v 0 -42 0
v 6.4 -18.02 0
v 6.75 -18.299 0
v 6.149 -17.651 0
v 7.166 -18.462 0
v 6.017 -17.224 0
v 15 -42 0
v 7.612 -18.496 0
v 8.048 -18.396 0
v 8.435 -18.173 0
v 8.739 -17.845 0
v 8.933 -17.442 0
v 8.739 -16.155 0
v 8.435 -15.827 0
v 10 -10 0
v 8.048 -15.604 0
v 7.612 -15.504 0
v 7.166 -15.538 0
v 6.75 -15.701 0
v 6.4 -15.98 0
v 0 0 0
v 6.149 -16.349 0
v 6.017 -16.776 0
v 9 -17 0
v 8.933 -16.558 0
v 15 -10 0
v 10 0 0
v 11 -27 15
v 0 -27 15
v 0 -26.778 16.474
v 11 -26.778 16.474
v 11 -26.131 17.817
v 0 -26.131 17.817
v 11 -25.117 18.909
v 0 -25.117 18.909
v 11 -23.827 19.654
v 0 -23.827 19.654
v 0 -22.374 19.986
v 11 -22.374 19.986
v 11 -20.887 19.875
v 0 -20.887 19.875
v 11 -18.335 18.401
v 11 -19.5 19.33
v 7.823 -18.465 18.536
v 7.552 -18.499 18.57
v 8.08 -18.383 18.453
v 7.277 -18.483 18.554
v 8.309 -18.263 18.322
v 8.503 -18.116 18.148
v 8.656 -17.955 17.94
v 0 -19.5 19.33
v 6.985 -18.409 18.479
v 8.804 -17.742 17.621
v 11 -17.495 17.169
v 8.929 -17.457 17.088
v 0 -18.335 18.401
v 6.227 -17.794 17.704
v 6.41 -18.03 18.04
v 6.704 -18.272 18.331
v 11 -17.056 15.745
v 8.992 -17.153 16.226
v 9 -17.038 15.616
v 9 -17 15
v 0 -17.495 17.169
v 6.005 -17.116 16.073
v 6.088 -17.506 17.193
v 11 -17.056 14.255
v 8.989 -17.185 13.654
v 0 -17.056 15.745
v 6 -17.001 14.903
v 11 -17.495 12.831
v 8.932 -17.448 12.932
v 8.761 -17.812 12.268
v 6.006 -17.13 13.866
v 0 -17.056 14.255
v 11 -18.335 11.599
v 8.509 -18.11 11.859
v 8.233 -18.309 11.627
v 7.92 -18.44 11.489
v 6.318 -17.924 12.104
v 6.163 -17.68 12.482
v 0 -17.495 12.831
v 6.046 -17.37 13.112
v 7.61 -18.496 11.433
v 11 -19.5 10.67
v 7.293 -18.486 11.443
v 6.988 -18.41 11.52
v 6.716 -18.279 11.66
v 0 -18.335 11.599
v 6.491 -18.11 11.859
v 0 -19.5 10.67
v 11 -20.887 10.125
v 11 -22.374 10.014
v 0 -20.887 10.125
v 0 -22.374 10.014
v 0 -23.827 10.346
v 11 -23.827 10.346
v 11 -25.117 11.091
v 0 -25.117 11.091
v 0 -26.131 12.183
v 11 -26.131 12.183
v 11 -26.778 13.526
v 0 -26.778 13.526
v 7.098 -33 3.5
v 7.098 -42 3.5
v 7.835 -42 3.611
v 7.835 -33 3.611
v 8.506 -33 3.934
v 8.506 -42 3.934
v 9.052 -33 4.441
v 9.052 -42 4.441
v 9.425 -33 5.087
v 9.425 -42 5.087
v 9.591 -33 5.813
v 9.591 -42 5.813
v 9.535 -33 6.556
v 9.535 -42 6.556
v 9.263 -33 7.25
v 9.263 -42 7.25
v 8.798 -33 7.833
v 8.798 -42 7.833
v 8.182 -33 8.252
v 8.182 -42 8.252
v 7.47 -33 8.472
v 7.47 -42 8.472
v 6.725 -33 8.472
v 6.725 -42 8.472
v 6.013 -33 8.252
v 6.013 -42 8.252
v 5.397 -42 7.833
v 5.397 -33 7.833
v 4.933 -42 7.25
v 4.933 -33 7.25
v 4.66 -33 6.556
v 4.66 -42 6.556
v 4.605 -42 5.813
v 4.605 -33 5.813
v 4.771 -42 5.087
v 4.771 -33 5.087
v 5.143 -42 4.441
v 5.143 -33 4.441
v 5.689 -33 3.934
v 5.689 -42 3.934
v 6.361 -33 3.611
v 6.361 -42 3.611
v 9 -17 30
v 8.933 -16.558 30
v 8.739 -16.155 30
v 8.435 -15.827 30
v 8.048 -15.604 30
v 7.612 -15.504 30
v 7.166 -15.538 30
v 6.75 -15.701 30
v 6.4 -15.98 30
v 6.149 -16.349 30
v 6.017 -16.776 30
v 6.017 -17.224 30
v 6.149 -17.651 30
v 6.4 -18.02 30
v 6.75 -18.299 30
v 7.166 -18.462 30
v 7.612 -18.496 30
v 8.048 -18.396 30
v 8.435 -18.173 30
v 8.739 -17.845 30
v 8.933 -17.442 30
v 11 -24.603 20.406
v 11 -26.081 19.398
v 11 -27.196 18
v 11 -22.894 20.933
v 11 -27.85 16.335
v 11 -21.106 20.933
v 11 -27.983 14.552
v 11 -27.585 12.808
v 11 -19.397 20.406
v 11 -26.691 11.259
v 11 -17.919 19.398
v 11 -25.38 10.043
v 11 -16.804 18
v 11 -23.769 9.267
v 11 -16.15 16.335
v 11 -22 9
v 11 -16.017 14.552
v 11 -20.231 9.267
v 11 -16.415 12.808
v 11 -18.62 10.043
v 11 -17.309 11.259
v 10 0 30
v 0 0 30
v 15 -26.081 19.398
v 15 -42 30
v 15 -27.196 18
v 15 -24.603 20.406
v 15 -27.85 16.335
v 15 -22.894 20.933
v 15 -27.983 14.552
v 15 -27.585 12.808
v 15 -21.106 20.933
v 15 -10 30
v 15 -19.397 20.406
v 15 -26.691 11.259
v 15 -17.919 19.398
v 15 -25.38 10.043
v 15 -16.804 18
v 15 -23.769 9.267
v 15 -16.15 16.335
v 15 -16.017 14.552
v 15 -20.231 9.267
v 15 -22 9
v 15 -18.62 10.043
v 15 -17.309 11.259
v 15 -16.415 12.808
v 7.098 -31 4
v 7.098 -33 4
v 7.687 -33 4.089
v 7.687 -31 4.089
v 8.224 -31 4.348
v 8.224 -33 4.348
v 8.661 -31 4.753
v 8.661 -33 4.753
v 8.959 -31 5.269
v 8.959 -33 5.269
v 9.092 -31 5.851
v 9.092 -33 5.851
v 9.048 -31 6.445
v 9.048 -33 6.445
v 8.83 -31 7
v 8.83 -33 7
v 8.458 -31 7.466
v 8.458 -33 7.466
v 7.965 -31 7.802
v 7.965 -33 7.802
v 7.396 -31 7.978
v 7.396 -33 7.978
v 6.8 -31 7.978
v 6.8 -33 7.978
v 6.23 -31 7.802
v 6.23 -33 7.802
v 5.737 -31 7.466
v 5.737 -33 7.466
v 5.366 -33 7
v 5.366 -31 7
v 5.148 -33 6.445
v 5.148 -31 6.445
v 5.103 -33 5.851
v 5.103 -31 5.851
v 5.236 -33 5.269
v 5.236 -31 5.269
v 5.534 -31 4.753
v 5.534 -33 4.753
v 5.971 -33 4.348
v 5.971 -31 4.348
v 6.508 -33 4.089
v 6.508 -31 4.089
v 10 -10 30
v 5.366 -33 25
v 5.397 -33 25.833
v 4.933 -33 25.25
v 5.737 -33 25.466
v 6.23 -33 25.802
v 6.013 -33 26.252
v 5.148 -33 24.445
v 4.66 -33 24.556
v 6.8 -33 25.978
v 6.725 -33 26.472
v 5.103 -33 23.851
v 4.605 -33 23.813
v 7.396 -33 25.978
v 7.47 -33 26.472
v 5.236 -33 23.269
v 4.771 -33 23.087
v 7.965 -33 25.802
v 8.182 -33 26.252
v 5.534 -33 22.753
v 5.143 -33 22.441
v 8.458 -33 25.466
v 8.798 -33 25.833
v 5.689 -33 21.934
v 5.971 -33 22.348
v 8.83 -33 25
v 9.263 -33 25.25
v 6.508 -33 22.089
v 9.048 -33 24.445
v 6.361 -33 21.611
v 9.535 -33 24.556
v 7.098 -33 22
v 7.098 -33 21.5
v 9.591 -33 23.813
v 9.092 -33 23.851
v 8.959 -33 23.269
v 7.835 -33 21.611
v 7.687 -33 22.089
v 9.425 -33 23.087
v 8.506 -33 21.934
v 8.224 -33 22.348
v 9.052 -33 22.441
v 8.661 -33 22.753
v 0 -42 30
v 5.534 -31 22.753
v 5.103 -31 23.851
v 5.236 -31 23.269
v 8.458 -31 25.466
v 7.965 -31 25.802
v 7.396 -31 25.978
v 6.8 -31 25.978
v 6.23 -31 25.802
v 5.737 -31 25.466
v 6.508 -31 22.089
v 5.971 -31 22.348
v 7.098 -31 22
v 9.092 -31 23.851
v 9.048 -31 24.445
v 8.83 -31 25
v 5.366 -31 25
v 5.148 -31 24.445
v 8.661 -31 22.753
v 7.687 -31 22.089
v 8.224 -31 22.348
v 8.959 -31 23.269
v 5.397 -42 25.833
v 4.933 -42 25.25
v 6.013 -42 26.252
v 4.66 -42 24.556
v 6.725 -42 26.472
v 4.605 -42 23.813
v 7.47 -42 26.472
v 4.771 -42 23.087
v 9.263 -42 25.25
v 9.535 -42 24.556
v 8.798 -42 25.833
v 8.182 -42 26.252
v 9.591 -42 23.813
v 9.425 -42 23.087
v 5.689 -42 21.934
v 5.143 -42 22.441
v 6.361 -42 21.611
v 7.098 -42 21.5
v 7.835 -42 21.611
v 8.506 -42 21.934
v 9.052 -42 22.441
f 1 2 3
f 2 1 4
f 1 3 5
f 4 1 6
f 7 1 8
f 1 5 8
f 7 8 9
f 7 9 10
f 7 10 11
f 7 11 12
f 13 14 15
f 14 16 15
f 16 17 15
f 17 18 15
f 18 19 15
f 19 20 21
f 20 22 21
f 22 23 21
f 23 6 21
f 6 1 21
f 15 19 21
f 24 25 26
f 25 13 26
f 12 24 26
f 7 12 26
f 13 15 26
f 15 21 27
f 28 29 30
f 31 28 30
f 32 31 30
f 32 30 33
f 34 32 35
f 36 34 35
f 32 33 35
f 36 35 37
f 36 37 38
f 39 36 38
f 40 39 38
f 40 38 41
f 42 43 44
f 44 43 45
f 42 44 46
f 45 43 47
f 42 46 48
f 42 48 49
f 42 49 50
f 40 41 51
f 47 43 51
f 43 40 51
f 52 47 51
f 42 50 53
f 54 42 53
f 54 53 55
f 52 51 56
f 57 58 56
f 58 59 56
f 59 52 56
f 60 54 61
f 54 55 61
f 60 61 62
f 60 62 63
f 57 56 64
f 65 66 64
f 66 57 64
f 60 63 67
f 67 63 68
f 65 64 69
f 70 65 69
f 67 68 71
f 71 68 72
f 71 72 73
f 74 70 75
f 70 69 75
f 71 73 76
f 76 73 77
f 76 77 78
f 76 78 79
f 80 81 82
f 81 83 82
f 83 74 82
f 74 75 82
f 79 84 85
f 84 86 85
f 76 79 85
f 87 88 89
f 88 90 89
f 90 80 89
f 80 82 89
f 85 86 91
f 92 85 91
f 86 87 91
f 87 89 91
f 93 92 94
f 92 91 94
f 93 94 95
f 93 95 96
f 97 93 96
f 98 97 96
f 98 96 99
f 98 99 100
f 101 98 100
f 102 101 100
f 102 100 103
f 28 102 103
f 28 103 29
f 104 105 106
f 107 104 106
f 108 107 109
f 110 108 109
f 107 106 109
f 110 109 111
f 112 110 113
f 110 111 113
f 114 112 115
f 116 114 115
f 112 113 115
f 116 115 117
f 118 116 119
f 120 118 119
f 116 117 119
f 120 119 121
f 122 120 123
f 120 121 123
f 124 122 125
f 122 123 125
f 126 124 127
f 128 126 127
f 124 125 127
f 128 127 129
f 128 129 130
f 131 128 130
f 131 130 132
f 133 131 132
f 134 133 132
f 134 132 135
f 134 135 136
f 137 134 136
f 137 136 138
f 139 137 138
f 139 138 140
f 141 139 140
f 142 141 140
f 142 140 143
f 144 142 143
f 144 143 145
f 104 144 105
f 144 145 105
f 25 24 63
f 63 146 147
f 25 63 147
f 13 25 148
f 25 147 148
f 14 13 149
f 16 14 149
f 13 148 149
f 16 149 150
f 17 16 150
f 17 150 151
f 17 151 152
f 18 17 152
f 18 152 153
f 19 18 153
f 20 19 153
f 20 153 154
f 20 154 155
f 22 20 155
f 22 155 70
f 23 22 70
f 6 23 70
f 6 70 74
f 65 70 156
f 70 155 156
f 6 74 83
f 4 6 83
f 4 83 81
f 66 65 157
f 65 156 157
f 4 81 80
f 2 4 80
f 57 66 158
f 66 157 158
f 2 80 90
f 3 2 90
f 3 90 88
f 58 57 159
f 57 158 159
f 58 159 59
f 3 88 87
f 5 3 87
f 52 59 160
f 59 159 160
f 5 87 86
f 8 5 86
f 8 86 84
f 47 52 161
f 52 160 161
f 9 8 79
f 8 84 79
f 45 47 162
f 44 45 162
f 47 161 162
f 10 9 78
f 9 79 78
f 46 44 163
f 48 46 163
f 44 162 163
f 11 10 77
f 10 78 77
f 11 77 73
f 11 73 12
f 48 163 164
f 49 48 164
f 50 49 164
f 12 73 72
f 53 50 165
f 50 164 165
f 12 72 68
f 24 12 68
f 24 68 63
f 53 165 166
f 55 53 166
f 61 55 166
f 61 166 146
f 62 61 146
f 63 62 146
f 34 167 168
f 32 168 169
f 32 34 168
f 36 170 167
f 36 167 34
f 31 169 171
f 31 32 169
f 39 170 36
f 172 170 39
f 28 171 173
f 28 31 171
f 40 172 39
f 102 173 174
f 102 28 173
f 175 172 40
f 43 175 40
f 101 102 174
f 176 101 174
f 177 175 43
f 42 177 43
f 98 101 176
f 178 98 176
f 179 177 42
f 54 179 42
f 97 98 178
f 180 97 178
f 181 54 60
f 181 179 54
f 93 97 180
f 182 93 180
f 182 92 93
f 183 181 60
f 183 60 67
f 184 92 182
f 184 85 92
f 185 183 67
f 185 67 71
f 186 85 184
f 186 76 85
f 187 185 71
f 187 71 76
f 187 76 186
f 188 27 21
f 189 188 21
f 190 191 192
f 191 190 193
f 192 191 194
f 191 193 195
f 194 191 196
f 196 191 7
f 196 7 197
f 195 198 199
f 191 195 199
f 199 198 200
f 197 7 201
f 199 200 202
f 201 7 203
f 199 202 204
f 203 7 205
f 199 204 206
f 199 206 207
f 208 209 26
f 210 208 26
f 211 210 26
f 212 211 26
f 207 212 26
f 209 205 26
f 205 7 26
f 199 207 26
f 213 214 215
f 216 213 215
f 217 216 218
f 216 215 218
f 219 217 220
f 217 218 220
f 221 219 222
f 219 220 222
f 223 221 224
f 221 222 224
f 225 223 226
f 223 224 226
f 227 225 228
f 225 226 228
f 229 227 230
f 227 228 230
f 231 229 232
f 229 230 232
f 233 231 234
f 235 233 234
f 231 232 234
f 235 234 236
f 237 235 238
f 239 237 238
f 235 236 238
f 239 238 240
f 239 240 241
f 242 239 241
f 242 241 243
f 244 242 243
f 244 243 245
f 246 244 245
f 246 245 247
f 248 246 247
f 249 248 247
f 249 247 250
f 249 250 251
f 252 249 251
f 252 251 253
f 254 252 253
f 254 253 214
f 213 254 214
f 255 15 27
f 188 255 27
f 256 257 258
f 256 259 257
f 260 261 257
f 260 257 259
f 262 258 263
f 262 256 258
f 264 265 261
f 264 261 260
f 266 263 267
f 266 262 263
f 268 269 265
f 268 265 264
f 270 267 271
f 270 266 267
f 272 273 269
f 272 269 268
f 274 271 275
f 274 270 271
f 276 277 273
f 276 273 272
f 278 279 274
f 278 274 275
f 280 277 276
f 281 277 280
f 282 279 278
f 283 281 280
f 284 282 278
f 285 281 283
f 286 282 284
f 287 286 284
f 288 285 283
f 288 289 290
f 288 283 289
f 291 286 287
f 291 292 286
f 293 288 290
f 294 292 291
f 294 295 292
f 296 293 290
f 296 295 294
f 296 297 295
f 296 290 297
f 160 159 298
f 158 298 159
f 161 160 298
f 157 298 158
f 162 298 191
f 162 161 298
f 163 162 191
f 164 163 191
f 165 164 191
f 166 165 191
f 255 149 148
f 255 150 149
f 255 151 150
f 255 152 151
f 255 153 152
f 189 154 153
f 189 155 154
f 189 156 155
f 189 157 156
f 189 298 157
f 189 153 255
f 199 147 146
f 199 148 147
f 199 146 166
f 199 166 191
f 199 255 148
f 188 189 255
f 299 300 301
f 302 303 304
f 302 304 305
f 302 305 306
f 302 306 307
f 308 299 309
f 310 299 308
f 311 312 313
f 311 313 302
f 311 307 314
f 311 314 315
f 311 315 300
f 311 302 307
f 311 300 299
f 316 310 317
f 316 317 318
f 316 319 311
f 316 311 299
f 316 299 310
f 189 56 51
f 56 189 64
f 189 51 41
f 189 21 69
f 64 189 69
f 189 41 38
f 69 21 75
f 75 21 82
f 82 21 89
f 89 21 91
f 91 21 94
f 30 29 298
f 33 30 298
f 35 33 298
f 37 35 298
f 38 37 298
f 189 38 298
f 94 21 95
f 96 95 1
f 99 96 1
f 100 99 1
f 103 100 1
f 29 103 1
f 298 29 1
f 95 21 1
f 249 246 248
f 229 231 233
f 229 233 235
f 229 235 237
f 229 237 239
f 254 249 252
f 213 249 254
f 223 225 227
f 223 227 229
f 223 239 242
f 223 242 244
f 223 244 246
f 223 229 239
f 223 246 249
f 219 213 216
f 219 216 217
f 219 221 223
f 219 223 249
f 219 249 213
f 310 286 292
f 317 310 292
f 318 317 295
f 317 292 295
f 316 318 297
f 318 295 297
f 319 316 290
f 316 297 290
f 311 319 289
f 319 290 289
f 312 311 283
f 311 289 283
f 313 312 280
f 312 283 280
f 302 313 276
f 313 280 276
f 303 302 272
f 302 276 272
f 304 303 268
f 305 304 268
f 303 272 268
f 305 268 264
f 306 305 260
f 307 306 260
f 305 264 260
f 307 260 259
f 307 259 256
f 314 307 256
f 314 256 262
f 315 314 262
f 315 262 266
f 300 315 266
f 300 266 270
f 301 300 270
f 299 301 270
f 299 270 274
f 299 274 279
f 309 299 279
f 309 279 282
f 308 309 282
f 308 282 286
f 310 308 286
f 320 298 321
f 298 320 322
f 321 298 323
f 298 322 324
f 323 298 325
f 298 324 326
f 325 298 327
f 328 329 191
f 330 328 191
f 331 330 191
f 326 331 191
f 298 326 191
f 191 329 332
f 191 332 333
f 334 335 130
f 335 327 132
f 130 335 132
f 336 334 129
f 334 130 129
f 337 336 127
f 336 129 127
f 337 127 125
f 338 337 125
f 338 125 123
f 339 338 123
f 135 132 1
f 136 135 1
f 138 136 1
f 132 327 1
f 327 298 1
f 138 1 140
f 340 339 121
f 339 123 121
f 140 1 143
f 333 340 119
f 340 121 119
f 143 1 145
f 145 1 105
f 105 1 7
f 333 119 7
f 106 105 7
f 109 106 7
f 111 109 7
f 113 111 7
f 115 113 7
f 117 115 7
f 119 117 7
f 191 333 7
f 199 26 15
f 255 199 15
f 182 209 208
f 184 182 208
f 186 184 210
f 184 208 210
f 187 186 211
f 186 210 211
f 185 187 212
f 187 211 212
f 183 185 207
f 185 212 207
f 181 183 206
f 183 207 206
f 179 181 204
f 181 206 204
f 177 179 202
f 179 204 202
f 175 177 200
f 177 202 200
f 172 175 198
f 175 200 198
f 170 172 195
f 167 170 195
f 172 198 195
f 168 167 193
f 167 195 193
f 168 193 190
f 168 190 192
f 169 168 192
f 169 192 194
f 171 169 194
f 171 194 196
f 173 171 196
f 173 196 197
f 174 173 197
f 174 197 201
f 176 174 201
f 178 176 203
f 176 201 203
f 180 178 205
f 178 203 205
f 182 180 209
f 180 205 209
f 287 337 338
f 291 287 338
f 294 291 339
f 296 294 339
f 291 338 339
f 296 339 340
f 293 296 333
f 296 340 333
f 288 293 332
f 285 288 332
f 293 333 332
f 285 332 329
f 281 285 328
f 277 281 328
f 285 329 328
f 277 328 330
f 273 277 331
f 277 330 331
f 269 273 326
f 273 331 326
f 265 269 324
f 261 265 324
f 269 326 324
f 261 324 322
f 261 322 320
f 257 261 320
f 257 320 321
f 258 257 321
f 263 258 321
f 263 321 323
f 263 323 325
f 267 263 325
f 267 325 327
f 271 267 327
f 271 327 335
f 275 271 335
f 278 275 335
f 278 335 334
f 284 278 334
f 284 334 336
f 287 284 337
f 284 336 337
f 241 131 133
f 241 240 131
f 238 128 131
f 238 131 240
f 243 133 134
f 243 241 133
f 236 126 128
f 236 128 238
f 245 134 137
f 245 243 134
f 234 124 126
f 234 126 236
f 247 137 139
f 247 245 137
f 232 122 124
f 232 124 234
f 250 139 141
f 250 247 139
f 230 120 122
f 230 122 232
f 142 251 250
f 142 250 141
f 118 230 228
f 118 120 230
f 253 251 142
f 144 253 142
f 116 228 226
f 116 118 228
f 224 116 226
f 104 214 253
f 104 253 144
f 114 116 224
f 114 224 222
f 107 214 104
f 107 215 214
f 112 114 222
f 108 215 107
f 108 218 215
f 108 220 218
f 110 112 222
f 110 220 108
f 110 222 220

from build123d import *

# Parameters (mm, degrees)
RESSALTO_EXTRUS_O1_DEPTH = 30
ESBO_O4_R                = 6
CORTE_EXTRUS_O1_DEPTH    = 4
ESBO_O5_R                = 5
CORTE_EXTRUS_O2_DEPTH    = 11
ESBO_O6_R                = 1.5
CORTE_EXTRUS_O3_DEPTH    = 54.749418602
ESBO_O7_R                = 2.5
CORTE_EXTRUS_O4_DEPTH    = 9
ESBO_O8_R                = 2
CORTE_EXTRUS_O5_DEPTH    = 11


with BuildPart() as part:
    # Esboço2 → Ressalto-extrusão1 (new body)
    with BuildSketch(Plane.XY):
        Polygon((0, 0), (0, -42), (15, -42), (15, -10), (10, -10), (10, 0), align=None)
    extrude(amount=RESSALTO_EXTRUS_O1_DEPTH)

    # Esboço4 → Corte-extrusão1 (cut)
    with BuildSketch(Plane(origin=(15, 0, 0), x_dir=(0, 0, -1), z_dir=(1, 0, 0))):
        with Locations((-15, -22)):
            Circle(ESBO_O4_R)
    extrude(amount=-CORTE_EXTRUS_O1_DEPTH, mode=Mode.SUBTRACT)

    # Esboço5 → Corte-extrusão2 (cut)
    with BuildSketch(Plane.ZY):
        with Locations(Location((15, -22, 0), (0, 0, 270))):
            Circle(ESBO_O5_R)
    extrude(amount=-CORTE_EXTRUS_O2_DEPTH, mode=Mode.SUBTRACT)

    # Esboço6 → Corte-extrusão3 (cut, through all)
    with BuildSketch(Plane.XY.offset(30)):
        with Locations((7.5, -17)):
            Circle(ESBO_O6_R)
    extrude(amount=-CORTE_EXTRUS_O3_DEPTH, mode=Mode.SUBTRACT)

    # Esboço7 → Corte-extrusão4 (cut)
    with BuildSketch(Plane.XZ.offset(42)):
        with Locations(Location((7.097716039, 24, 0), (0, 0, 270))):
            Circle(ESBO_O7_R)
        with Locations(Location((7.097716039, 6, 0), (0, 0, 270))):
            Circle(ESBO_O7_R)
    extrude(amount=-CORTE_EXTRUS_O4_DEPTH, mode=Mode.SUBTRACT)

    # Esboço8 → Corte-extrusão5 (cut)
    with BuildSketch(Plane.XZ.offset(42)):
        with Locations(Location((7.097716039, 24, 0), (0, 0, 270))):
            Circle(ESBO_O8_R)
        with Locations(Location((7.097716039, 6, 0), (0, 0, 270))):
            Circle(ESBO_O8_R)
    extrude(amount=-CORTE_EXTRUS_O5_DEPTH, mode=Mode.SUBTRACT)


solid = part.part
